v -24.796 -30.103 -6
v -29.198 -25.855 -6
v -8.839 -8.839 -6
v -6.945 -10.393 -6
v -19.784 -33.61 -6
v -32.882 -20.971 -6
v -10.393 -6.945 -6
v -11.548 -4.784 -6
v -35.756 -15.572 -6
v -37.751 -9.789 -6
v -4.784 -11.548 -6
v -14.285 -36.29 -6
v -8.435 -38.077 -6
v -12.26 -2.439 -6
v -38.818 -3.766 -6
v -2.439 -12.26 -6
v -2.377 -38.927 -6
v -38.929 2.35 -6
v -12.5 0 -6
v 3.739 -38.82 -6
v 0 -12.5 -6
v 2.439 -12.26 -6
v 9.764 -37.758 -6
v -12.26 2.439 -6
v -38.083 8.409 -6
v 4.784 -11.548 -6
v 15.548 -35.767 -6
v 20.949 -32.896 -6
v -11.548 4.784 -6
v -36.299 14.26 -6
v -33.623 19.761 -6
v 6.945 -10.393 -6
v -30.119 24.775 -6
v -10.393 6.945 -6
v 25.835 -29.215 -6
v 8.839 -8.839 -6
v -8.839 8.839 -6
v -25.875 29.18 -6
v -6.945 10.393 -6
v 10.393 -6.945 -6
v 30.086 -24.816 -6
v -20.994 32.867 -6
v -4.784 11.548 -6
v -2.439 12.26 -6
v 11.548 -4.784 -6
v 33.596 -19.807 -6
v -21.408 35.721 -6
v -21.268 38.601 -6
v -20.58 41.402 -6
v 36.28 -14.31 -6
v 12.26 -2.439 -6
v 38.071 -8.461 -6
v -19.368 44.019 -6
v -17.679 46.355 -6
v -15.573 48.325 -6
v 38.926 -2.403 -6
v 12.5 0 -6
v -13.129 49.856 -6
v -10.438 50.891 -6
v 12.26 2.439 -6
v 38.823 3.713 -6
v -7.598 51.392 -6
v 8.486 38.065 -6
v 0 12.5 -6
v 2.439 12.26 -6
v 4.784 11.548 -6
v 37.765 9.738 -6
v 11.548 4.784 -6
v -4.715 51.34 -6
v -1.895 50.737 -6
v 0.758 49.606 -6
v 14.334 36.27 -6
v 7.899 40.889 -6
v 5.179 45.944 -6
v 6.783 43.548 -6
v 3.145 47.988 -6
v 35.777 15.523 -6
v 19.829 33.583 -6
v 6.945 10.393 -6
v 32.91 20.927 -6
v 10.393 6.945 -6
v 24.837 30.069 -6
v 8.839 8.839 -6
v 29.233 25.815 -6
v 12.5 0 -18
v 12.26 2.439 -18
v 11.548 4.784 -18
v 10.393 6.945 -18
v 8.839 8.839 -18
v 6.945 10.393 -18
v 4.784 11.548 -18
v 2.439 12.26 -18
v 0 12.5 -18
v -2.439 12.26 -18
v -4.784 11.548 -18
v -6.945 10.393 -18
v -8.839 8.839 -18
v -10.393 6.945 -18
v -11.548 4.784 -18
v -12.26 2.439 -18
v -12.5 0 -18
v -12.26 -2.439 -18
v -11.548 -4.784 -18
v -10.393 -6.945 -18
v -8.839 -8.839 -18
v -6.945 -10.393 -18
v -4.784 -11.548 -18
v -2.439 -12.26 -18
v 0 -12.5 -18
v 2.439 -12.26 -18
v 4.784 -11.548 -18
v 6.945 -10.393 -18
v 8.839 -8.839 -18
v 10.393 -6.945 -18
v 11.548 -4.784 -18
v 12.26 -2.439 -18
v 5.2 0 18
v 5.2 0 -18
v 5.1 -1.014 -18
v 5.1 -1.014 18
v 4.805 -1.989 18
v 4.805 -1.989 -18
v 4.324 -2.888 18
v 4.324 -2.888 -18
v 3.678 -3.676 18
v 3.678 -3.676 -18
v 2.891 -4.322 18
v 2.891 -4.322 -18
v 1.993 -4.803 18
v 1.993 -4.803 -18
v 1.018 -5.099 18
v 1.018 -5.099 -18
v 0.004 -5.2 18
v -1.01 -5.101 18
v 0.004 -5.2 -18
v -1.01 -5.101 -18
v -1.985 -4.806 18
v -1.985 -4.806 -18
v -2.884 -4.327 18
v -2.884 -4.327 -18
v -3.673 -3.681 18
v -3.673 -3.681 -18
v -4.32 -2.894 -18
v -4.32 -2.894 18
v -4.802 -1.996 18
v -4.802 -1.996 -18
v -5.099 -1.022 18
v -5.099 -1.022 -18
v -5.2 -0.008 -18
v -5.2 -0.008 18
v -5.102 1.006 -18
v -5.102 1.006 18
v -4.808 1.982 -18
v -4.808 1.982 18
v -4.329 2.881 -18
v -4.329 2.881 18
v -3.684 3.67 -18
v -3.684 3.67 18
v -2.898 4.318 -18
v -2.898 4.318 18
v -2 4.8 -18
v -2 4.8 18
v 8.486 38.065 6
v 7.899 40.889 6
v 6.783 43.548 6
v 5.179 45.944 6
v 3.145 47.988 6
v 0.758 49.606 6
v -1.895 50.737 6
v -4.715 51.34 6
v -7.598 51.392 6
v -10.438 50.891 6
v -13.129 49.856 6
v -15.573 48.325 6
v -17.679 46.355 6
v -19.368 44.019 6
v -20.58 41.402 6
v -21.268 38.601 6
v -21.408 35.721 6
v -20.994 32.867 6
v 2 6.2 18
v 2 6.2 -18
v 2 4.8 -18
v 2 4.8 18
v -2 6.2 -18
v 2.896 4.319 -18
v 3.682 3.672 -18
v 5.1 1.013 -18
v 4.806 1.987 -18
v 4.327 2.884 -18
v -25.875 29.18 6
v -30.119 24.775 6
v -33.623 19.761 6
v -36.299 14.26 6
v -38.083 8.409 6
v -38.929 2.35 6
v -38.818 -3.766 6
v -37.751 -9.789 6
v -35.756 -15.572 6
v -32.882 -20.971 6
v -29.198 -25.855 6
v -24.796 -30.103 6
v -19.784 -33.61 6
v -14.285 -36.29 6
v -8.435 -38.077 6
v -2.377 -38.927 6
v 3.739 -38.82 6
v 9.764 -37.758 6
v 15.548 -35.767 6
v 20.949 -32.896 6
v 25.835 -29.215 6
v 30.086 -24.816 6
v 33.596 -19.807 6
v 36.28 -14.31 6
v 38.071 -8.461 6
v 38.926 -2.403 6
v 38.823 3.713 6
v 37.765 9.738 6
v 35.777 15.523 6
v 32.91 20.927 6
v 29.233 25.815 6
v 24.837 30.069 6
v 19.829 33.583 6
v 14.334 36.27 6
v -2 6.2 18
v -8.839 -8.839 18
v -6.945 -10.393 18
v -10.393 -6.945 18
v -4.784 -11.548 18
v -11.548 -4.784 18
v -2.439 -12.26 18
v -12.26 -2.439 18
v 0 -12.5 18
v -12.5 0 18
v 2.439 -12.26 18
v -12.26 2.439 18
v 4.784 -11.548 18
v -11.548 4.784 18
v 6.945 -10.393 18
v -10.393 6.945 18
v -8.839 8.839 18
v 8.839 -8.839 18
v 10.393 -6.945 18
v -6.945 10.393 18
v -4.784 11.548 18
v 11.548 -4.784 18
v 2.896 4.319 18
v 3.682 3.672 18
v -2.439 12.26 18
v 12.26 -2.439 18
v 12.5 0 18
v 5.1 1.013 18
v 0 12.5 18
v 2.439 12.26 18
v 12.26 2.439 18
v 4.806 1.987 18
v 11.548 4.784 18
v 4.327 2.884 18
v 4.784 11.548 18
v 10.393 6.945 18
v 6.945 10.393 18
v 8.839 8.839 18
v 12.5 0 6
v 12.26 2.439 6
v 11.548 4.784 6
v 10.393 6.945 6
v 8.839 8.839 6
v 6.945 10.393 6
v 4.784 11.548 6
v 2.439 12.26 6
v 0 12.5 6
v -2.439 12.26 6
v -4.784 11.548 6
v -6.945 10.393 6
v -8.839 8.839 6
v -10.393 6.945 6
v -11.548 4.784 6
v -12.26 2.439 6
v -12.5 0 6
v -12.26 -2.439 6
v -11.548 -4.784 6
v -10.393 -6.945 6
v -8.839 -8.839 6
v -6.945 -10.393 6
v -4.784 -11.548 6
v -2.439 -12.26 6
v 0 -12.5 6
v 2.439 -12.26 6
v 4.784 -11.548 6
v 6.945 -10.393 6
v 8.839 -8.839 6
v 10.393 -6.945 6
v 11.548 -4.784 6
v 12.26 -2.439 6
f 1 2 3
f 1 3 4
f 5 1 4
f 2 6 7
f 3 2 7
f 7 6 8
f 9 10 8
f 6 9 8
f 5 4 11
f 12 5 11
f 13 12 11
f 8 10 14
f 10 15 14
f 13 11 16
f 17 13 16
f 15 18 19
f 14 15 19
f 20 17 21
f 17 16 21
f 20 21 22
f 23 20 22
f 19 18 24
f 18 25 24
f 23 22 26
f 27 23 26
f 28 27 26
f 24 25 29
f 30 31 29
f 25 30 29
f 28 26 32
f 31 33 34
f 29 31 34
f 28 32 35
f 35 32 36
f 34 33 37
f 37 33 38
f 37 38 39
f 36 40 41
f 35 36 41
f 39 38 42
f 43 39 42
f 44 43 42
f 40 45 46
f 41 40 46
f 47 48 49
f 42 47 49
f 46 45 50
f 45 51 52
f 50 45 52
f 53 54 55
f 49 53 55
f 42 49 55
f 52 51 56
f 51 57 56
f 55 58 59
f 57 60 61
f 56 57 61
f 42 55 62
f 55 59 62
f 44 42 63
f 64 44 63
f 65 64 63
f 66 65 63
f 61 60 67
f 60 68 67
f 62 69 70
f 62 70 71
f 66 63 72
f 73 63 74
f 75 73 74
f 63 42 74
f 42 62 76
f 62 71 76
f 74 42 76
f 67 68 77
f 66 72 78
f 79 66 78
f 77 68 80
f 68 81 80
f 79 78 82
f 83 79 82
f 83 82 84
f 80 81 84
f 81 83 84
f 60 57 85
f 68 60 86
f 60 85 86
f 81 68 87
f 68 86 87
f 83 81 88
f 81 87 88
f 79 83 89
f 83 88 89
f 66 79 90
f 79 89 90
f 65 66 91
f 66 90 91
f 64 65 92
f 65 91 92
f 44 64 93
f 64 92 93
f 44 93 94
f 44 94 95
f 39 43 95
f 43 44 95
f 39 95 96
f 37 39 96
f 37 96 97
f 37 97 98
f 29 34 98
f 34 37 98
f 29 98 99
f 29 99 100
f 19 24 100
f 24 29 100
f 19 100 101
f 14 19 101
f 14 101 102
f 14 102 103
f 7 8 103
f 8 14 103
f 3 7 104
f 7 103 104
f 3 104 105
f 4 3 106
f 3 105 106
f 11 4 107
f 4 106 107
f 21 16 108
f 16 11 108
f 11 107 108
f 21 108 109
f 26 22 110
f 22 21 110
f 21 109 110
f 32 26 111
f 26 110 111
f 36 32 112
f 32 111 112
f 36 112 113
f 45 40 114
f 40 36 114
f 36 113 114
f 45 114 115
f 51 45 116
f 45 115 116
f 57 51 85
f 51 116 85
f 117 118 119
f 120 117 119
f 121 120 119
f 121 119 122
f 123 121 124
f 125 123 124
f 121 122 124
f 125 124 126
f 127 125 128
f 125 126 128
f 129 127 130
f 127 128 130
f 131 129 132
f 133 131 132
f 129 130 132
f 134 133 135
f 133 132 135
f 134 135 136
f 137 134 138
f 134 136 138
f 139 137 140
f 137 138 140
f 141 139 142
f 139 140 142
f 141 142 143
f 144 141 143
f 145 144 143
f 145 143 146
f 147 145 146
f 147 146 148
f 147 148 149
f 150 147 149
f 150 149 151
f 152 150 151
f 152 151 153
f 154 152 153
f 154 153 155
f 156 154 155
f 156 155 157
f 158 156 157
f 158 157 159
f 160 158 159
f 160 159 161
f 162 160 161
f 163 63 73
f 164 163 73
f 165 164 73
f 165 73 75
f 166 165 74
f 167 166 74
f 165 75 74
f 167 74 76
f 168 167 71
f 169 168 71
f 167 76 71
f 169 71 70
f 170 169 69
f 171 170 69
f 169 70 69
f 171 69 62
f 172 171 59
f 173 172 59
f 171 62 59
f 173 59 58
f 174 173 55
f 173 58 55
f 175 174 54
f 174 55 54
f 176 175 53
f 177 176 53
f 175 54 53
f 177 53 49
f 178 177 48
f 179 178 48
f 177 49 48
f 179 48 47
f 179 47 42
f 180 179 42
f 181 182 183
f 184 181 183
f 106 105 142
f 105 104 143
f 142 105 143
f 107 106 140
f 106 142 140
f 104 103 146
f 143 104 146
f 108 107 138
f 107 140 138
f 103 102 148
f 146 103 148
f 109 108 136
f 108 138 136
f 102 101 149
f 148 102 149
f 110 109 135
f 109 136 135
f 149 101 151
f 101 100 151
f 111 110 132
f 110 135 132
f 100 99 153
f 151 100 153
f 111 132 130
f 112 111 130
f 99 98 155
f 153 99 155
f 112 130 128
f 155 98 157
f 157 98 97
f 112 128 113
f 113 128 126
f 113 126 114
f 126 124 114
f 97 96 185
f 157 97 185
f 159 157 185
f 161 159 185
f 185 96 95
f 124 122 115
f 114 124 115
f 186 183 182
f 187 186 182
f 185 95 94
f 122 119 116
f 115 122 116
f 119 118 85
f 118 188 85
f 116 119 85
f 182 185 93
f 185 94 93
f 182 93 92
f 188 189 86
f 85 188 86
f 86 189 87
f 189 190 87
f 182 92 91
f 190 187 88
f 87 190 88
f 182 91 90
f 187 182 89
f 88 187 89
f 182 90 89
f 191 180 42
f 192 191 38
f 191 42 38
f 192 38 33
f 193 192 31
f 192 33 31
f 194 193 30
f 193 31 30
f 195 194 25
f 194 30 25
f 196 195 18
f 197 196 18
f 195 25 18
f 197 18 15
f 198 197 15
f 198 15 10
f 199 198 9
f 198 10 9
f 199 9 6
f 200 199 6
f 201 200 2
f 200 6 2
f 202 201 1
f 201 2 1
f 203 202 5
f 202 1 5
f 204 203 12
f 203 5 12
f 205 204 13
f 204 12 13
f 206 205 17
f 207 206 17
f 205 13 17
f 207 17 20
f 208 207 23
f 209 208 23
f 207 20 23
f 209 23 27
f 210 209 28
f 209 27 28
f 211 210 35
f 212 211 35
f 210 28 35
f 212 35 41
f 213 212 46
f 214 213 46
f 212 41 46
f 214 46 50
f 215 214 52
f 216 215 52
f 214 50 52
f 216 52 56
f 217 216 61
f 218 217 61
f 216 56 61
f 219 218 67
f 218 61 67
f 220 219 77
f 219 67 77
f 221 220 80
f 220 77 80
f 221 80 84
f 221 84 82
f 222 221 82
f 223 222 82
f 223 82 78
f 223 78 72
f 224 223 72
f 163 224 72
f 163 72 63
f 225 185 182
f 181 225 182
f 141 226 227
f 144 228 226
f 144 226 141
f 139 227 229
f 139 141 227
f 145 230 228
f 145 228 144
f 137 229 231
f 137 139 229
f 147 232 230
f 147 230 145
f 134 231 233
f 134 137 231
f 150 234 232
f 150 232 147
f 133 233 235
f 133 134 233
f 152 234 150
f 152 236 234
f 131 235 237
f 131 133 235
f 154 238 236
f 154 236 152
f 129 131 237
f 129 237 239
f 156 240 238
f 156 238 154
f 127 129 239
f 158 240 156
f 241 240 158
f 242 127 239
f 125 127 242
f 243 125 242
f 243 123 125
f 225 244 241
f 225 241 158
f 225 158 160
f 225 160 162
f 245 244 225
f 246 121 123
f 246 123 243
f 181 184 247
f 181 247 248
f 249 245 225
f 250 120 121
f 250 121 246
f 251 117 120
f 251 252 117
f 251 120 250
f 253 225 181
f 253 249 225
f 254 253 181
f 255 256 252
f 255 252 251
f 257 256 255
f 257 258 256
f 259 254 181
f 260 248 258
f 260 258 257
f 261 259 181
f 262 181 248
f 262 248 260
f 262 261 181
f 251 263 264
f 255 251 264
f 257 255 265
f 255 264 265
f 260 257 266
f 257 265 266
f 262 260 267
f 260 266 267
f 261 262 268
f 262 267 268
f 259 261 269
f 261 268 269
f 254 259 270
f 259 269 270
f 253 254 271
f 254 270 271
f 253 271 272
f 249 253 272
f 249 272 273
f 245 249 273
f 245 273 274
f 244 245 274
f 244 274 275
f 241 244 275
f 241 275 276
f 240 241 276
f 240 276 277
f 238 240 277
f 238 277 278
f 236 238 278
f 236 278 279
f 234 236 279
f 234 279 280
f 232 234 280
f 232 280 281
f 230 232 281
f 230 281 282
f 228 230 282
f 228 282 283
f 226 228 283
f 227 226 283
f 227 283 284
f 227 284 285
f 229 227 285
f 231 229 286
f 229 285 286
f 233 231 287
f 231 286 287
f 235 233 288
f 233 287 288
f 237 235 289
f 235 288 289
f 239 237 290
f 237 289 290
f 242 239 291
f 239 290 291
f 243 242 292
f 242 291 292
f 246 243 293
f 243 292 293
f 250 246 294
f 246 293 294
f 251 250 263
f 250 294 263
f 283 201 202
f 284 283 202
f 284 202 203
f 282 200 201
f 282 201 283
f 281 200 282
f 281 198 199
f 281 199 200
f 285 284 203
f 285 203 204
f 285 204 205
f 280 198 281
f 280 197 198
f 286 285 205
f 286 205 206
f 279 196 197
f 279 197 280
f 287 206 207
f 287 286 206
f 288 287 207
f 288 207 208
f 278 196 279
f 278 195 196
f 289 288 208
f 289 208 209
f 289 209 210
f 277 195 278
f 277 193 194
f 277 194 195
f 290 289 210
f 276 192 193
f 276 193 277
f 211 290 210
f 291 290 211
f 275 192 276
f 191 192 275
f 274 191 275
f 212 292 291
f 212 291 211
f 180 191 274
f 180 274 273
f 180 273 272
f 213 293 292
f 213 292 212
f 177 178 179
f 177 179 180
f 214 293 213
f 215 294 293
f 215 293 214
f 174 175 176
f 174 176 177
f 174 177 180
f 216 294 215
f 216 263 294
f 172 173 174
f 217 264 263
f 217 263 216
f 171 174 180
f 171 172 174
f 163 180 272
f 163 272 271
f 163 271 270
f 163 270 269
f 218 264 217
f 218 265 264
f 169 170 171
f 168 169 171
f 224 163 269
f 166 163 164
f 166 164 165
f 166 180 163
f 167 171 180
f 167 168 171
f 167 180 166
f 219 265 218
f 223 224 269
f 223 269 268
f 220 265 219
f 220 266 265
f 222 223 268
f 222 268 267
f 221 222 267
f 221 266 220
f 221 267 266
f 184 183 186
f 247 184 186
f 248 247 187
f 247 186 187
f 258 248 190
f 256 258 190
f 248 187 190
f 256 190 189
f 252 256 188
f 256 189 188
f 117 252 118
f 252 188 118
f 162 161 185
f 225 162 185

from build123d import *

# Parameters (mm, degrees)
BOSS_EXTRUDE1_DEPTH      = 6
BOSS_EXTRUDE1_DEPTH_BACK = 6
BOSS_EXTRUDE2_DEPTH      = 18
BOSS_EXTRUDE2_DEPTH_BACK = 18
SKETCH1_4_R              = 12.5


with BuildPart() as part:
    # Sketch1 → Boss-Extrude1 (new, two sides: drawn at the far end of the back side and taken through both)
    with BuildSketch(Plane.XY.offset(-BOSS_EXTRUDE1_DEPTH_BACK)):
        with BuildLine():
            ThreePointArc((8.486454979, 38.065470993), (-9.029705239, 51.210003157), (-20.993816965, 32.86730365))
            ThreePointArc((-20.993816965, 32.86730365), (6.772278929, -38.407502367), (8.486454979, 38.065470993))
        make_face()
        with BuildLine():
            Line((-2, 6.2), (2, 6.2))
            Line((2, 6.2), (2, 4.8))
            ThreePointArc((2, 4.8), (0, -5.2), (-2, 4.8))
            Line((-2, 4.8), (-2, 6.2))
        make_face(mode=Mode.SUBTRACT)
    extrude(amount=BOSS_EXTRUDE1_DEPTH + BOSS_EXTRUDE1_DEPTH_BACK)

    # Sketch1<4> → Boss-Extrude2 (add, two sides: drawn at the far end of the back side and taken through both)
    with BuildSketch(Plane.XY.offset(-BOSS_EXTRUDE2_DEPTH_BACK)):
        Circle(SKETCH1_4_R)
        with BuildLine():
            Line((-2, 4.8), (-2, 6.2))
            Line((-2, 6.2), (2, 6.2))
            Line((2, 6.2), (2, 4.8))
            ThreePointArc((2, 4.8), (4.326661531, 2.88444102), (5.2, 0))
            ThreePointArc((5.2, 0), (-2.88444102, -4.326661531), (-2, 4.8))
        make_face(mode=Mode.SUBTRACT)
    extrude(amount=BOSS_EXTRUDE2_DEPTH + BOSS_EXTRUDE2_DEPTH_BACK)


solid = part.part
